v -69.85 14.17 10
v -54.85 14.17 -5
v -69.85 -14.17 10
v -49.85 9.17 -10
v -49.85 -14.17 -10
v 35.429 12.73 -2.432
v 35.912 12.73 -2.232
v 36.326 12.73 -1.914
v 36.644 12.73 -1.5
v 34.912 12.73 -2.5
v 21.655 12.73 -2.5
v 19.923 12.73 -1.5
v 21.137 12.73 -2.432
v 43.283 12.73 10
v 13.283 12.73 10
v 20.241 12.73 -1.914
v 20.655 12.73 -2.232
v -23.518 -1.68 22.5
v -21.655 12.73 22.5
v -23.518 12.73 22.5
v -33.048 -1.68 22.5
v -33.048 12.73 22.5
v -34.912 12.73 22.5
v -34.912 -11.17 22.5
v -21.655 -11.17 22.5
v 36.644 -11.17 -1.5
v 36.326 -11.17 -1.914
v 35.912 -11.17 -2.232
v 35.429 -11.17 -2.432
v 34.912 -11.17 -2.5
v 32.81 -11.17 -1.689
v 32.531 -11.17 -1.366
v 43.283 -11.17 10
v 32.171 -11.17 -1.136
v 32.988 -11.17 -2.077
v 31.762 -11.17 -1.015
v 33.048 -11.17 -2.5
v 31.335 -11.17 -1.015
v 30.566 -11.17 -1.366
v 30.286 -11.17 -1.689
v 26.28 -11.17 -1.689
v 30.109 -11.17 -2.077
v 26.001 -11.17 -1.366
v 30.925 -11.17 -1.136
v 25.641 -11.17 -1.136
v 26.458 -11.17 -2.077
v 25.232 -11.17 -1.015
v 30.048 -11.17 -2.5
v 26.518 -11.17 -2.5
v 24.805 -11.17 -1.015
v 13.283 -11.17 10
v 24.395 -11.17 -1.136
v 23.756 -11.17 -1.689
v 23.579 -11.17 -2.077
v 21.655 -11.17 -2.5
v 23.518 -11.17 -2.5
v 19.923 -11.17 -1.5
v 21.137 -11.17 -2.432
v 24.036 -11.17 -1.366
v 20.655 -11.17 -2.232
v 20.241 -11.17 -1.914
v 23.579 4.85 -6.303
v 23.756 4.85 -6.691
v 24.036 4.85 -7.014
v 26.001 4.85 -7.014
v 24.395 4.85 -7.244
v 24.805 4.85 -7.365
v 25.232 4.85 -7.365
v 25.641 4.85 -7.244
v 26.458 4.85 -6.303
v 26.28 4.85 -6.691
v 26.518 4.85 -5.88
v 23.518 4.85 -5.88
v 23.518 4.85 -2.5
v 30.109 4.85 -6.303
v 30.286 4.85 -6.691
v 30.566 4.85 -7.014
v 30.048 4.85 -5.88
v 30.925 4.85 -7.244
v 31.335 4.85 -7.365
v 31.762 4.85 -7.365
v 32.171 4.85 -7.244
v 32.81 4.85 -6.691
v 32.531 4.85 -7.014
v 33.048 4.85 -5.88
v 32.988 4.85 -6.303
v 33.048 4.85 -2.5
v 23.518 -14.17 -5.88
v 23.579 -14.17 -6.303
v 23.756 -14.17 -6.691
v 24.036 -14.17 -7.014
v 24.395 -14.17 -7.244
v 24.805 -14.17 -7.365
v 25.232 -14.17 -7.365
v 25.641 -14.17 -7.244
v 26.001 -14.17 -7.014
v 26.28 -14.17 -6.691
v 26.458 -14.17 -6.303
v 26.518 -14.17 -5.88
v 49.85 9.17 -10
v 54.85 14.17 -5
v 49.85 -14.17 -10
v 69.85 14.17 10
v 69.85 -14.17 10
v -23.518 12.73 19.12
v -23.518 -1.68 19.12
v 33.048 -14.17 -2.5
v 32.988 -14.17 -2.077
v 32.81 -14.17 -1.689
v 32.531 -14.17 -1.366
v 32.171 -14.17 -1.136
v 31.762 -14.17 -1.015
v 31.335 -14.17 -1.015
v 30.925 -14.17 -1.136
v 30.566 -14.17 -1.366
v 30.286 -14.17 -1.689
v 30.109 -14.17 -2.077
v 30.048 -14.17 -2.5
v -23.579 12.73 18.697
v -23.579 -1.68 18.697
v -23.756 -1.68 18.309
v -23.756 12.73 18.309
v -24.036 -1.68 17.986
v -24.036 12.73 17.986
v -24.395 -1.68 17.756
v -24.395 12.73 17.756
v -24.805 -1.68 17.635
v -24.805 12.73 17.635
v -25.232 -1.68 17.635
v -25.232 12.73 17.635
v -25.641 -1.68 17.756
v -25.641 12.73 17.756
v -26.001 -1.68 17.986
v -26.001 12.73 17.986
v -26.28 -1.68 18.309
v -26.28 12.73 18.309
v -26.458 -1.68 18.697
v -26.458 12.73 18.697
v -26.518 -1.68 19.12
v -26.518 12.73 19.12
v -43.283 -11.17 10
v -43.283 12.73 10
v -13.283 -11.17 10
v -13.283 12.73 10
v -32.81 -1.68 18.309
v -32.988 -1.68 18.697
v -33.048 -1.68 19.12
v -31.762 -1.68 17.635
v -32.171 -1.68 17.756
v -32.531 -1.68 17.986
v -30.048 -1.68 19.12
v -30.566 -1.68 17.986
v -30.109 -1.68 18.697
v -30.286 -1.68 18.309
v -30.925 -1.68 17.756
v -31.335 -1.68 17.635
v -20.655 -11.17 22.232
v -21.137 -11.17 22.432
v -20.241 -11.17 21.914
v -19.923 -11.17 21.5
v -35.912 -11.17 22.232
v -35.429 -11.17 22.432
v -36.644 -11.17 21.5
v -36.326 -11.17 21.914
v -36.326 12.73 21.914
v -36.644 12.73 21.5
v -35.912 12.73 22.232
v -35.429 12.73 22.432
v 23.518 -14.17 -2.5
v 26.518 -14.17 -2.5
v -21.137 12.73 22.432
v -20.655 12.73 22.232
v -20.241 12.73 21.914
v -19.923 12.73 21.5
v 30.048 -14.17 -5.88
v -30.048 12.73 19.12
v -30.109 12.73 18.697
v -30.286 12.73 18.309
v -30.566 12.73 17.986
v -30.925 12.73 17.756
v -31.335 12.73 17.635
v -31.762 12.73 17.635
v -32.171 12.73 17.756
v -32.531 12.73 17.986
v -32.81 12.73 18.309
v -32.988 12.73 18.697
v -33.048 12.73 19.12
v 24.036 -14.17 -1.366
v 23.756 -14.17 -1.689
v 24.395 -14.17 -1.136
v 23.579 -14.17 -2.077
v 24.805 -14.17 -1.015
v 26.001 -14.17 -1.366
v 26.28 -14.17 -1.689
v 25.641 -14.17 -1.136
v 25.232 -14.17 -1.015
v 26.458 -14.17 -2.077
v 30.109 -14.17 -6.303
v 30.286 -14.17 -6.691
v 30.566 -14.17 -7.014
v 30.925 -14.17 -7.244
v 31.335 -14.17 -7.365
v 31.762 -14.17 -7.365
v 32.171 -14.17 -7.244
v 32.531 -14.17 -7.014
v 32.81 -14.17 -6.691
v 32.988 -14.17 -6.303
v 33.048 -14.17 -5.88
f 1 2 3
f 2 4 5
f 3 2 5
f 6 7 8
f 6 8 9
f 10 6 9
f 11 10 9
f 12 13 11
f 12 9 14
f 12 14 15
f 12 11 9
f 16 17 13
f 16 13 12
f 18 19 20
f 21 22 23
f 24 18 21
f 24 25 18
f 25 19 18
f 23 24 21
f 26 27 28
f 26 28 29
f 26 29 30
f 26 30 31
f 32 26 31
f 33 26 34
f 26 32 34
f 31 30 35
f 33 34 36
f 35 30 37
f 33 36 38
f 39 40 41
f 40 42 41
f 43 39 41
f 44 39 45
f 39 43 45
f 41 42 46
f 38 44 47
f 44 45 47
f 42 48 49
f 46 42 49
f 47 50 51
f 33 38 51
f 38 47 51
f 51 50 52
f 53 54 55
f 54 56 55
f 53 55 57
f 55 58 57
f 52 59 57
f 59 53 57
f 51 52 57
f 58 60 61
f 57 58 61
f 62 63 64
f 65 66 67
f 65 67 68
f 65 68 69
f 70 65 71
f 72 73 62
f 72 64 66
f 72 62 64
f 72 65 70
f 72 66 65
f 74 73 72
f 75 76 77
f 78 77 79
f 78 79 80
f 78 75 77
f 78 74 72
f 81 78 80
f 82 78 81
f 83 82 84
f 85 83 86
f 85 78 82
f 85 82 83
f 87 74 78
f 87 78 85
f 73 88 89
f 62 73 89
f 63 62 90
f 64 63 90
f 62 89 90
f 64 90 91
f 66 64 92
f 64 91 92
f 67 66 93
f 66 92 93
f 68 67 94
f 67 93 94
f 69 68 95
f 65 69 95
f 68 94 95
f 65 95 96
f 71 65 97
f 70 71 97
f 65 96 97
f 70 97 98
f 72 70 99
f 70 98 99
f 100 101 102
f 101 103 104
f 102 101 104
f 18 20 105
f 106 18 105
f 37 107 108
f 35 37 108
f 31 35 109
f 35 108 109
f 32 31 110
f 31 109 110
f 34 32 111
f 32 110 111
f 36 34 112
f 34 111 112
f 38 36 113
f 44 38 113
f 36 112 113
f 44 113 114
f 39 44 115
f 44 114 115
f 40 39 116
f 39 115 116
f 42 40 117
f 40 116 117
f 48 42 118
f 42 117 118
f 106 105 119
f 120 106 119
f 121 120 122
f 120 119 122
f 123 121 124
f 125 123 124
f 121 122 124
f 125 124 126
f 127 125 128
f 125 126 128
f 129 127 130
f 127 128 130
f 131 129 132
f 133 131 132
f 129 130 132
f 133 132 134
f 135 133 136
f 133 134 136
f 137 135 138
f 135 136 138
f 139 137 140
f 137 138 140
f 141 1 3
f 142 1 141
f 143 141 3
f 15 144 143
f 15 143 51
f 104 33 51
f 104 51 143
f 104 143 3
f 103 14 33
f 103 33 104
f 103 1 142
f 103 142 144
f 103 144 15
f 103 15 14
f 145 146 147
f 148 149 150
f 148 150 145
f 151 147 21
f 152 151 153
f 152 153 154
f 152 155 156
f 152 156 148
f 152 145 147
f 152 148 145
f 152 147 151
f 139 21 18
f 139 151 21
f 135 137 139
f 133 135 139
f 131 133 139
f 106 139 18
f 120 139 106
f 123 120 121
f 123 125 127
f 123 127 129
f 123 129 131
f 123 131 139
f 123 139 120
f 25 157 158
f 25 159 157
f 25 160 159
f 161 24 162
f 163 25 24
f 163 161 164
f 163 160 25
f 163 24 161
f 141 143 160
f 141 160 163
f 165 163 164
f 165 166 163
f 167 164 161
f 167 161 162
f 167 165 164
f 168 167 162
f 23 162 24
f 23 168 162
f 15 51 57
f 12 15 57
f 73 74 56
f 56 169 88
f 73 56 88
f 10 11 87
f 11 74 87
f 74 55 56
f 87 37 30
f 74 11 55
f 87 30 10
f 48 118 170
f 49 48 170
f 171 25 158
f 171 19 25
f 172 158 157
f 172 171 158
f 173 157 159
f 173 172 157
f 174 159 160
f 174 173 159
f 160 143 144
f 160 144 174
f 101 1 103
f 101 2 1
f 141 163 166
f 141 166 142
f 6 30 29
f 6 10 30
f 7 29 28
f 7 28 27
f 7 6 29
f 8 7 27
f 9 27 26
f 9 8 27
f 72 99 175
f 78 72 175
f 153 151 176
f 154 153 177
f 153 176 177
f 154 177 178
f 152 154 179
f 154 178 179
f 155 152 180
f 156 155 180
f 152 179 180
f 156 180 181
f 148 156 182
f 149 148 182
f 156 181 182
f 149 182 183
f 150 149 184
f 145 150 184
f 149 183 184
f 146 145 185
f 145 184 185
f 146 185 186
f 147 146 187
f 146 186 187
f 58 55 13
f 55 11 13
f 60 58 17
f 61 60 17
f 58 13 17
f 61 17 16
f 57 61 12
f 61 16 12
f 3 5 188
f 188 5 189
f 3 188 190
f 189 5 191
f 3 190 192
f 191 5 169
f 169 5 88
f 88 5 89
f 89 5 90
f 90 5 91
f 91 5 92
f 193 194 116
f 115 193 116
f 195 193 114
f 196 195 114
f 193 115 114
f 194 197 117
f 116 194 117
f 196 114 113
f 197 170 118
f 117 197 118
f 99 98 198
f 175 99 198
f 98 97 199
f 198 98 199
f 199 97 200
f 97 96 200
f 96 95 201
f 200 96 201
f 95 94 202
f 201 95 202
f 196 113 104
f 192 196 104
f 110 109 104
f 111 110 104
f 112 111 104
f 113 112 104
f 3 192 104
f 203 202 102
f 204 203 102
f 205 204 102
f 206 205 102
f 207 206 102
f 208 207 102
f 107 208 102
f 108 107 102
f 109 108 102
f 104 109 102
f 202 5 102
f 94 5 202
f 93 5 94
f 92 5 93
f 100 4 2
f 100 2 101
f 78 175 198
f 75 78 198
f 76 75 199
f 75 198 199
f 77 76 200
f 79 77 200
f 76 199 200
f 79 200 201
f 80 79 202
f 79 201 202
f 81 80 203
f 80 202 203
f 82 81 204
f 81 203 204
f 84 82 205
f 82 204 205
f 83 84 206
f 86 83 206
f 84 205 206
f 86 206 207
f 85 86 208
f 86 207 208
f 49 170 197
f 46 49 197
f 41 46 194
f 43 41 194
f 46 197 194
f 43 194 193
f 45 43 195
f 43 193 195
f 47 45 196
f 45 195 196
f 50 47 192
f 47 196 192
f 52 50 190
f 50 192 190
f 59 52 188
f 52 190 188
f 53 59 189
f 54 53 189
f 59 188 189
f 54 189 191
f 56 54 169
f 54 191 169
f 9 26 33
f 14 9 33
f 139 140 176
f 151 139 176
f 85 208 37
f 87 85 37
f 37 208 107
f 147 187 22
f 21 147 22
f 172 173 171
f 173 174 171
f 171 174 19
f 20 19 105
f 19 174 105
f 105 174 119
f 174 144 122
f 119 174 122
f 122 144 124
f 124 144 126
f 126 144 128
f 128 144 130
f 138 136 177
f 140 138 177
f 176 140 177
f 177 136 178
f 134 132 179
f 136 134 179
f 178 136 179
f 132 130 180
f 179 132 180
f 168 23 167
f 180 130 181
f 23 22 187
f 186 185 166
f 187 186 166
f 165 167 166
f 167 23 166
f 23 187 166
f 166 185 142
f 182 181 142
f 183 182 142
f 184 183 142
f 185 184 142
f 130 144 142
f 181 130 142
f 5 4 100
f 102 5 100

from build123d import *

# Parameters (mm, degrees)
SKETCH1_W           = 139.7
SKETCH1_H           = 20
BOSS_EXTRUDE1_DEPTH = 14.17
CUT_EXTRUDE1_DEPTH  = 23.9
BOSS_EXTRUDE2_DEPTH = 23.9
CHAMFER1_SIZE       = 20
CHAMFER2_SIZE       = 5
CUT_EXTRUDE2_DEPTH  = 14.41
CUT_EXTRUDE3_DEPTH  = 19.02
FILLET1_R           = 2


with BuildPart() as part:
    # Sketch1 → Boss-Extrude1 (new, symmetric)
    with BuildSketch(Plane(origin=(0, 0, 0), x_dir=(1, 0, 0), z_dir=(0, 1, 0))):
        Rectangle(SKETCH1_W, SKETCH1_H)
    extrude(amount=BOSS_EXTRUDE1_DEPTH, both=True)

    # Sketch3 → Cut-Extrude1 (cut)
    with BuildSketch(Plane(origin=(0, -11.17, 0), x_dir=(-1, 0, 0), z_dir=(0, -1, 0))):
        Polygon((-13.283333333, -10), (-20.500211698, 2.5), (-36.066454968, 2.5), (-43.283333333, -10), align=None)
    extrude(amount=-CUT_EXTRUDE1_DEPTH, mode=Mode.SUBTRACT)

    # Sketch4 → Boss-Extrude2 (add)
    with BuildSketch(Plane(origin=(0, -11.17, 0), x_dir=(-1, 0, 0), z_dir=(0, -1, 0))):
        Polygon((43.283333333, -10), (13.283333333, -10), (20.500211698, -22.5), (36.066454968, -22.5), align=None)
    extrude(amount=-BOSS_EXTRUDE2_DEPTH)

    # Chamfer1
    chamfer1_edges = [part.edges().sort_by_distance(p)[0] for p in [
        (69.85, 0, -10),
        (-69.85, 0, -10),
    ]]
    chamfer(chamfer1_edges, length=CHAMFER1_SIZE - 0.0001)  # a hair under: the kernel refuses the full size

    # Chamfer2
    chamfer2_edges = [part.edges().sort_by_distance(p)[0] for p in [
        (0, 14.17, -10),
    ]]
    chamfer(chamfer2_edges, length=CHAMFER2_SIZE)

    # Sketch5 → Cut-Extrude2 (cut)
    with BuildSketch(Plane(origin=(0, 12.73, 0), x_dir=(1, 0, 0), z_dir=(0, 1, 0))):
        with BuildLine():
            Line((-33.048333333, -19.12), (-33.048333333, -22.5))
            Line((-33.048333333, -22.5), (-23.518333333, -22.5))
            Line((-23.518333333, -22.5), (-23.518333333, -19.12))
            ThreePointArc((-23.518333333, -19.12), (-25.018333333, -17.62), (-26.518333333, -19.12))
            Line((-26.518333333, -19.12), (-30.048333333, -19.12))
            ThreePointArc((-30.048333333, -19.12), (-31.548333333, -17.62), (-33.048333333, -19.12))
        make_face()
    extrude(amount=-CUT_EXTRUDE2_DEPTH, mode=Mode.SUBTRACT)

    # Sketch7 → Cut-Extrude3 (cut)
    with BuildSketch(Plane.XZ.offset(14.17)):
        with BuildLine():
            Line((23.518333333, -2.5), (23.518333333, -5.88))
            ThreePointArc((23.518333333, -5.88), (25.018333333, -7.38), (26.518333333, -5.88))
            Line((26.518333333, -5.88), (30.048333333, -5.88))
            ThreePointArc((30.048333333, -5.88), (31.548333333, -7.38), (33.048333333, -5.88))
            Line((33.048333333, -5.88), (33.048333333, -2.5))
            ThreePointArc((33.048333333, -2.5), (31.548333333, -1), (30.048333333, -2.5))
            Line((30.048333333, -2.5), (26.518333333, -2.5))
            ThreePointArc((26.518333333, -2.5), (25.018333333, -1), (23.518333333, -2.5))
        make_face()
    extrude(amount=-CUT_EXTRUDE3_DEPTH, mode=Mode.SUBTRACT)

    # Fillet1
    fillet1_edges = [part.edges().sort_by_distance(p)[0] for p in [
        (36.066454968, 0.78, -2.5),
        (20.500211698, 0.78, -2.5),
        (-36.066454968, 0.78, 22.5),
        (-20.500211698, 0.78, 22.5),
    ]]
    fillet(fillet1_edges, radius=FILLET1_R)


solid = part.part
